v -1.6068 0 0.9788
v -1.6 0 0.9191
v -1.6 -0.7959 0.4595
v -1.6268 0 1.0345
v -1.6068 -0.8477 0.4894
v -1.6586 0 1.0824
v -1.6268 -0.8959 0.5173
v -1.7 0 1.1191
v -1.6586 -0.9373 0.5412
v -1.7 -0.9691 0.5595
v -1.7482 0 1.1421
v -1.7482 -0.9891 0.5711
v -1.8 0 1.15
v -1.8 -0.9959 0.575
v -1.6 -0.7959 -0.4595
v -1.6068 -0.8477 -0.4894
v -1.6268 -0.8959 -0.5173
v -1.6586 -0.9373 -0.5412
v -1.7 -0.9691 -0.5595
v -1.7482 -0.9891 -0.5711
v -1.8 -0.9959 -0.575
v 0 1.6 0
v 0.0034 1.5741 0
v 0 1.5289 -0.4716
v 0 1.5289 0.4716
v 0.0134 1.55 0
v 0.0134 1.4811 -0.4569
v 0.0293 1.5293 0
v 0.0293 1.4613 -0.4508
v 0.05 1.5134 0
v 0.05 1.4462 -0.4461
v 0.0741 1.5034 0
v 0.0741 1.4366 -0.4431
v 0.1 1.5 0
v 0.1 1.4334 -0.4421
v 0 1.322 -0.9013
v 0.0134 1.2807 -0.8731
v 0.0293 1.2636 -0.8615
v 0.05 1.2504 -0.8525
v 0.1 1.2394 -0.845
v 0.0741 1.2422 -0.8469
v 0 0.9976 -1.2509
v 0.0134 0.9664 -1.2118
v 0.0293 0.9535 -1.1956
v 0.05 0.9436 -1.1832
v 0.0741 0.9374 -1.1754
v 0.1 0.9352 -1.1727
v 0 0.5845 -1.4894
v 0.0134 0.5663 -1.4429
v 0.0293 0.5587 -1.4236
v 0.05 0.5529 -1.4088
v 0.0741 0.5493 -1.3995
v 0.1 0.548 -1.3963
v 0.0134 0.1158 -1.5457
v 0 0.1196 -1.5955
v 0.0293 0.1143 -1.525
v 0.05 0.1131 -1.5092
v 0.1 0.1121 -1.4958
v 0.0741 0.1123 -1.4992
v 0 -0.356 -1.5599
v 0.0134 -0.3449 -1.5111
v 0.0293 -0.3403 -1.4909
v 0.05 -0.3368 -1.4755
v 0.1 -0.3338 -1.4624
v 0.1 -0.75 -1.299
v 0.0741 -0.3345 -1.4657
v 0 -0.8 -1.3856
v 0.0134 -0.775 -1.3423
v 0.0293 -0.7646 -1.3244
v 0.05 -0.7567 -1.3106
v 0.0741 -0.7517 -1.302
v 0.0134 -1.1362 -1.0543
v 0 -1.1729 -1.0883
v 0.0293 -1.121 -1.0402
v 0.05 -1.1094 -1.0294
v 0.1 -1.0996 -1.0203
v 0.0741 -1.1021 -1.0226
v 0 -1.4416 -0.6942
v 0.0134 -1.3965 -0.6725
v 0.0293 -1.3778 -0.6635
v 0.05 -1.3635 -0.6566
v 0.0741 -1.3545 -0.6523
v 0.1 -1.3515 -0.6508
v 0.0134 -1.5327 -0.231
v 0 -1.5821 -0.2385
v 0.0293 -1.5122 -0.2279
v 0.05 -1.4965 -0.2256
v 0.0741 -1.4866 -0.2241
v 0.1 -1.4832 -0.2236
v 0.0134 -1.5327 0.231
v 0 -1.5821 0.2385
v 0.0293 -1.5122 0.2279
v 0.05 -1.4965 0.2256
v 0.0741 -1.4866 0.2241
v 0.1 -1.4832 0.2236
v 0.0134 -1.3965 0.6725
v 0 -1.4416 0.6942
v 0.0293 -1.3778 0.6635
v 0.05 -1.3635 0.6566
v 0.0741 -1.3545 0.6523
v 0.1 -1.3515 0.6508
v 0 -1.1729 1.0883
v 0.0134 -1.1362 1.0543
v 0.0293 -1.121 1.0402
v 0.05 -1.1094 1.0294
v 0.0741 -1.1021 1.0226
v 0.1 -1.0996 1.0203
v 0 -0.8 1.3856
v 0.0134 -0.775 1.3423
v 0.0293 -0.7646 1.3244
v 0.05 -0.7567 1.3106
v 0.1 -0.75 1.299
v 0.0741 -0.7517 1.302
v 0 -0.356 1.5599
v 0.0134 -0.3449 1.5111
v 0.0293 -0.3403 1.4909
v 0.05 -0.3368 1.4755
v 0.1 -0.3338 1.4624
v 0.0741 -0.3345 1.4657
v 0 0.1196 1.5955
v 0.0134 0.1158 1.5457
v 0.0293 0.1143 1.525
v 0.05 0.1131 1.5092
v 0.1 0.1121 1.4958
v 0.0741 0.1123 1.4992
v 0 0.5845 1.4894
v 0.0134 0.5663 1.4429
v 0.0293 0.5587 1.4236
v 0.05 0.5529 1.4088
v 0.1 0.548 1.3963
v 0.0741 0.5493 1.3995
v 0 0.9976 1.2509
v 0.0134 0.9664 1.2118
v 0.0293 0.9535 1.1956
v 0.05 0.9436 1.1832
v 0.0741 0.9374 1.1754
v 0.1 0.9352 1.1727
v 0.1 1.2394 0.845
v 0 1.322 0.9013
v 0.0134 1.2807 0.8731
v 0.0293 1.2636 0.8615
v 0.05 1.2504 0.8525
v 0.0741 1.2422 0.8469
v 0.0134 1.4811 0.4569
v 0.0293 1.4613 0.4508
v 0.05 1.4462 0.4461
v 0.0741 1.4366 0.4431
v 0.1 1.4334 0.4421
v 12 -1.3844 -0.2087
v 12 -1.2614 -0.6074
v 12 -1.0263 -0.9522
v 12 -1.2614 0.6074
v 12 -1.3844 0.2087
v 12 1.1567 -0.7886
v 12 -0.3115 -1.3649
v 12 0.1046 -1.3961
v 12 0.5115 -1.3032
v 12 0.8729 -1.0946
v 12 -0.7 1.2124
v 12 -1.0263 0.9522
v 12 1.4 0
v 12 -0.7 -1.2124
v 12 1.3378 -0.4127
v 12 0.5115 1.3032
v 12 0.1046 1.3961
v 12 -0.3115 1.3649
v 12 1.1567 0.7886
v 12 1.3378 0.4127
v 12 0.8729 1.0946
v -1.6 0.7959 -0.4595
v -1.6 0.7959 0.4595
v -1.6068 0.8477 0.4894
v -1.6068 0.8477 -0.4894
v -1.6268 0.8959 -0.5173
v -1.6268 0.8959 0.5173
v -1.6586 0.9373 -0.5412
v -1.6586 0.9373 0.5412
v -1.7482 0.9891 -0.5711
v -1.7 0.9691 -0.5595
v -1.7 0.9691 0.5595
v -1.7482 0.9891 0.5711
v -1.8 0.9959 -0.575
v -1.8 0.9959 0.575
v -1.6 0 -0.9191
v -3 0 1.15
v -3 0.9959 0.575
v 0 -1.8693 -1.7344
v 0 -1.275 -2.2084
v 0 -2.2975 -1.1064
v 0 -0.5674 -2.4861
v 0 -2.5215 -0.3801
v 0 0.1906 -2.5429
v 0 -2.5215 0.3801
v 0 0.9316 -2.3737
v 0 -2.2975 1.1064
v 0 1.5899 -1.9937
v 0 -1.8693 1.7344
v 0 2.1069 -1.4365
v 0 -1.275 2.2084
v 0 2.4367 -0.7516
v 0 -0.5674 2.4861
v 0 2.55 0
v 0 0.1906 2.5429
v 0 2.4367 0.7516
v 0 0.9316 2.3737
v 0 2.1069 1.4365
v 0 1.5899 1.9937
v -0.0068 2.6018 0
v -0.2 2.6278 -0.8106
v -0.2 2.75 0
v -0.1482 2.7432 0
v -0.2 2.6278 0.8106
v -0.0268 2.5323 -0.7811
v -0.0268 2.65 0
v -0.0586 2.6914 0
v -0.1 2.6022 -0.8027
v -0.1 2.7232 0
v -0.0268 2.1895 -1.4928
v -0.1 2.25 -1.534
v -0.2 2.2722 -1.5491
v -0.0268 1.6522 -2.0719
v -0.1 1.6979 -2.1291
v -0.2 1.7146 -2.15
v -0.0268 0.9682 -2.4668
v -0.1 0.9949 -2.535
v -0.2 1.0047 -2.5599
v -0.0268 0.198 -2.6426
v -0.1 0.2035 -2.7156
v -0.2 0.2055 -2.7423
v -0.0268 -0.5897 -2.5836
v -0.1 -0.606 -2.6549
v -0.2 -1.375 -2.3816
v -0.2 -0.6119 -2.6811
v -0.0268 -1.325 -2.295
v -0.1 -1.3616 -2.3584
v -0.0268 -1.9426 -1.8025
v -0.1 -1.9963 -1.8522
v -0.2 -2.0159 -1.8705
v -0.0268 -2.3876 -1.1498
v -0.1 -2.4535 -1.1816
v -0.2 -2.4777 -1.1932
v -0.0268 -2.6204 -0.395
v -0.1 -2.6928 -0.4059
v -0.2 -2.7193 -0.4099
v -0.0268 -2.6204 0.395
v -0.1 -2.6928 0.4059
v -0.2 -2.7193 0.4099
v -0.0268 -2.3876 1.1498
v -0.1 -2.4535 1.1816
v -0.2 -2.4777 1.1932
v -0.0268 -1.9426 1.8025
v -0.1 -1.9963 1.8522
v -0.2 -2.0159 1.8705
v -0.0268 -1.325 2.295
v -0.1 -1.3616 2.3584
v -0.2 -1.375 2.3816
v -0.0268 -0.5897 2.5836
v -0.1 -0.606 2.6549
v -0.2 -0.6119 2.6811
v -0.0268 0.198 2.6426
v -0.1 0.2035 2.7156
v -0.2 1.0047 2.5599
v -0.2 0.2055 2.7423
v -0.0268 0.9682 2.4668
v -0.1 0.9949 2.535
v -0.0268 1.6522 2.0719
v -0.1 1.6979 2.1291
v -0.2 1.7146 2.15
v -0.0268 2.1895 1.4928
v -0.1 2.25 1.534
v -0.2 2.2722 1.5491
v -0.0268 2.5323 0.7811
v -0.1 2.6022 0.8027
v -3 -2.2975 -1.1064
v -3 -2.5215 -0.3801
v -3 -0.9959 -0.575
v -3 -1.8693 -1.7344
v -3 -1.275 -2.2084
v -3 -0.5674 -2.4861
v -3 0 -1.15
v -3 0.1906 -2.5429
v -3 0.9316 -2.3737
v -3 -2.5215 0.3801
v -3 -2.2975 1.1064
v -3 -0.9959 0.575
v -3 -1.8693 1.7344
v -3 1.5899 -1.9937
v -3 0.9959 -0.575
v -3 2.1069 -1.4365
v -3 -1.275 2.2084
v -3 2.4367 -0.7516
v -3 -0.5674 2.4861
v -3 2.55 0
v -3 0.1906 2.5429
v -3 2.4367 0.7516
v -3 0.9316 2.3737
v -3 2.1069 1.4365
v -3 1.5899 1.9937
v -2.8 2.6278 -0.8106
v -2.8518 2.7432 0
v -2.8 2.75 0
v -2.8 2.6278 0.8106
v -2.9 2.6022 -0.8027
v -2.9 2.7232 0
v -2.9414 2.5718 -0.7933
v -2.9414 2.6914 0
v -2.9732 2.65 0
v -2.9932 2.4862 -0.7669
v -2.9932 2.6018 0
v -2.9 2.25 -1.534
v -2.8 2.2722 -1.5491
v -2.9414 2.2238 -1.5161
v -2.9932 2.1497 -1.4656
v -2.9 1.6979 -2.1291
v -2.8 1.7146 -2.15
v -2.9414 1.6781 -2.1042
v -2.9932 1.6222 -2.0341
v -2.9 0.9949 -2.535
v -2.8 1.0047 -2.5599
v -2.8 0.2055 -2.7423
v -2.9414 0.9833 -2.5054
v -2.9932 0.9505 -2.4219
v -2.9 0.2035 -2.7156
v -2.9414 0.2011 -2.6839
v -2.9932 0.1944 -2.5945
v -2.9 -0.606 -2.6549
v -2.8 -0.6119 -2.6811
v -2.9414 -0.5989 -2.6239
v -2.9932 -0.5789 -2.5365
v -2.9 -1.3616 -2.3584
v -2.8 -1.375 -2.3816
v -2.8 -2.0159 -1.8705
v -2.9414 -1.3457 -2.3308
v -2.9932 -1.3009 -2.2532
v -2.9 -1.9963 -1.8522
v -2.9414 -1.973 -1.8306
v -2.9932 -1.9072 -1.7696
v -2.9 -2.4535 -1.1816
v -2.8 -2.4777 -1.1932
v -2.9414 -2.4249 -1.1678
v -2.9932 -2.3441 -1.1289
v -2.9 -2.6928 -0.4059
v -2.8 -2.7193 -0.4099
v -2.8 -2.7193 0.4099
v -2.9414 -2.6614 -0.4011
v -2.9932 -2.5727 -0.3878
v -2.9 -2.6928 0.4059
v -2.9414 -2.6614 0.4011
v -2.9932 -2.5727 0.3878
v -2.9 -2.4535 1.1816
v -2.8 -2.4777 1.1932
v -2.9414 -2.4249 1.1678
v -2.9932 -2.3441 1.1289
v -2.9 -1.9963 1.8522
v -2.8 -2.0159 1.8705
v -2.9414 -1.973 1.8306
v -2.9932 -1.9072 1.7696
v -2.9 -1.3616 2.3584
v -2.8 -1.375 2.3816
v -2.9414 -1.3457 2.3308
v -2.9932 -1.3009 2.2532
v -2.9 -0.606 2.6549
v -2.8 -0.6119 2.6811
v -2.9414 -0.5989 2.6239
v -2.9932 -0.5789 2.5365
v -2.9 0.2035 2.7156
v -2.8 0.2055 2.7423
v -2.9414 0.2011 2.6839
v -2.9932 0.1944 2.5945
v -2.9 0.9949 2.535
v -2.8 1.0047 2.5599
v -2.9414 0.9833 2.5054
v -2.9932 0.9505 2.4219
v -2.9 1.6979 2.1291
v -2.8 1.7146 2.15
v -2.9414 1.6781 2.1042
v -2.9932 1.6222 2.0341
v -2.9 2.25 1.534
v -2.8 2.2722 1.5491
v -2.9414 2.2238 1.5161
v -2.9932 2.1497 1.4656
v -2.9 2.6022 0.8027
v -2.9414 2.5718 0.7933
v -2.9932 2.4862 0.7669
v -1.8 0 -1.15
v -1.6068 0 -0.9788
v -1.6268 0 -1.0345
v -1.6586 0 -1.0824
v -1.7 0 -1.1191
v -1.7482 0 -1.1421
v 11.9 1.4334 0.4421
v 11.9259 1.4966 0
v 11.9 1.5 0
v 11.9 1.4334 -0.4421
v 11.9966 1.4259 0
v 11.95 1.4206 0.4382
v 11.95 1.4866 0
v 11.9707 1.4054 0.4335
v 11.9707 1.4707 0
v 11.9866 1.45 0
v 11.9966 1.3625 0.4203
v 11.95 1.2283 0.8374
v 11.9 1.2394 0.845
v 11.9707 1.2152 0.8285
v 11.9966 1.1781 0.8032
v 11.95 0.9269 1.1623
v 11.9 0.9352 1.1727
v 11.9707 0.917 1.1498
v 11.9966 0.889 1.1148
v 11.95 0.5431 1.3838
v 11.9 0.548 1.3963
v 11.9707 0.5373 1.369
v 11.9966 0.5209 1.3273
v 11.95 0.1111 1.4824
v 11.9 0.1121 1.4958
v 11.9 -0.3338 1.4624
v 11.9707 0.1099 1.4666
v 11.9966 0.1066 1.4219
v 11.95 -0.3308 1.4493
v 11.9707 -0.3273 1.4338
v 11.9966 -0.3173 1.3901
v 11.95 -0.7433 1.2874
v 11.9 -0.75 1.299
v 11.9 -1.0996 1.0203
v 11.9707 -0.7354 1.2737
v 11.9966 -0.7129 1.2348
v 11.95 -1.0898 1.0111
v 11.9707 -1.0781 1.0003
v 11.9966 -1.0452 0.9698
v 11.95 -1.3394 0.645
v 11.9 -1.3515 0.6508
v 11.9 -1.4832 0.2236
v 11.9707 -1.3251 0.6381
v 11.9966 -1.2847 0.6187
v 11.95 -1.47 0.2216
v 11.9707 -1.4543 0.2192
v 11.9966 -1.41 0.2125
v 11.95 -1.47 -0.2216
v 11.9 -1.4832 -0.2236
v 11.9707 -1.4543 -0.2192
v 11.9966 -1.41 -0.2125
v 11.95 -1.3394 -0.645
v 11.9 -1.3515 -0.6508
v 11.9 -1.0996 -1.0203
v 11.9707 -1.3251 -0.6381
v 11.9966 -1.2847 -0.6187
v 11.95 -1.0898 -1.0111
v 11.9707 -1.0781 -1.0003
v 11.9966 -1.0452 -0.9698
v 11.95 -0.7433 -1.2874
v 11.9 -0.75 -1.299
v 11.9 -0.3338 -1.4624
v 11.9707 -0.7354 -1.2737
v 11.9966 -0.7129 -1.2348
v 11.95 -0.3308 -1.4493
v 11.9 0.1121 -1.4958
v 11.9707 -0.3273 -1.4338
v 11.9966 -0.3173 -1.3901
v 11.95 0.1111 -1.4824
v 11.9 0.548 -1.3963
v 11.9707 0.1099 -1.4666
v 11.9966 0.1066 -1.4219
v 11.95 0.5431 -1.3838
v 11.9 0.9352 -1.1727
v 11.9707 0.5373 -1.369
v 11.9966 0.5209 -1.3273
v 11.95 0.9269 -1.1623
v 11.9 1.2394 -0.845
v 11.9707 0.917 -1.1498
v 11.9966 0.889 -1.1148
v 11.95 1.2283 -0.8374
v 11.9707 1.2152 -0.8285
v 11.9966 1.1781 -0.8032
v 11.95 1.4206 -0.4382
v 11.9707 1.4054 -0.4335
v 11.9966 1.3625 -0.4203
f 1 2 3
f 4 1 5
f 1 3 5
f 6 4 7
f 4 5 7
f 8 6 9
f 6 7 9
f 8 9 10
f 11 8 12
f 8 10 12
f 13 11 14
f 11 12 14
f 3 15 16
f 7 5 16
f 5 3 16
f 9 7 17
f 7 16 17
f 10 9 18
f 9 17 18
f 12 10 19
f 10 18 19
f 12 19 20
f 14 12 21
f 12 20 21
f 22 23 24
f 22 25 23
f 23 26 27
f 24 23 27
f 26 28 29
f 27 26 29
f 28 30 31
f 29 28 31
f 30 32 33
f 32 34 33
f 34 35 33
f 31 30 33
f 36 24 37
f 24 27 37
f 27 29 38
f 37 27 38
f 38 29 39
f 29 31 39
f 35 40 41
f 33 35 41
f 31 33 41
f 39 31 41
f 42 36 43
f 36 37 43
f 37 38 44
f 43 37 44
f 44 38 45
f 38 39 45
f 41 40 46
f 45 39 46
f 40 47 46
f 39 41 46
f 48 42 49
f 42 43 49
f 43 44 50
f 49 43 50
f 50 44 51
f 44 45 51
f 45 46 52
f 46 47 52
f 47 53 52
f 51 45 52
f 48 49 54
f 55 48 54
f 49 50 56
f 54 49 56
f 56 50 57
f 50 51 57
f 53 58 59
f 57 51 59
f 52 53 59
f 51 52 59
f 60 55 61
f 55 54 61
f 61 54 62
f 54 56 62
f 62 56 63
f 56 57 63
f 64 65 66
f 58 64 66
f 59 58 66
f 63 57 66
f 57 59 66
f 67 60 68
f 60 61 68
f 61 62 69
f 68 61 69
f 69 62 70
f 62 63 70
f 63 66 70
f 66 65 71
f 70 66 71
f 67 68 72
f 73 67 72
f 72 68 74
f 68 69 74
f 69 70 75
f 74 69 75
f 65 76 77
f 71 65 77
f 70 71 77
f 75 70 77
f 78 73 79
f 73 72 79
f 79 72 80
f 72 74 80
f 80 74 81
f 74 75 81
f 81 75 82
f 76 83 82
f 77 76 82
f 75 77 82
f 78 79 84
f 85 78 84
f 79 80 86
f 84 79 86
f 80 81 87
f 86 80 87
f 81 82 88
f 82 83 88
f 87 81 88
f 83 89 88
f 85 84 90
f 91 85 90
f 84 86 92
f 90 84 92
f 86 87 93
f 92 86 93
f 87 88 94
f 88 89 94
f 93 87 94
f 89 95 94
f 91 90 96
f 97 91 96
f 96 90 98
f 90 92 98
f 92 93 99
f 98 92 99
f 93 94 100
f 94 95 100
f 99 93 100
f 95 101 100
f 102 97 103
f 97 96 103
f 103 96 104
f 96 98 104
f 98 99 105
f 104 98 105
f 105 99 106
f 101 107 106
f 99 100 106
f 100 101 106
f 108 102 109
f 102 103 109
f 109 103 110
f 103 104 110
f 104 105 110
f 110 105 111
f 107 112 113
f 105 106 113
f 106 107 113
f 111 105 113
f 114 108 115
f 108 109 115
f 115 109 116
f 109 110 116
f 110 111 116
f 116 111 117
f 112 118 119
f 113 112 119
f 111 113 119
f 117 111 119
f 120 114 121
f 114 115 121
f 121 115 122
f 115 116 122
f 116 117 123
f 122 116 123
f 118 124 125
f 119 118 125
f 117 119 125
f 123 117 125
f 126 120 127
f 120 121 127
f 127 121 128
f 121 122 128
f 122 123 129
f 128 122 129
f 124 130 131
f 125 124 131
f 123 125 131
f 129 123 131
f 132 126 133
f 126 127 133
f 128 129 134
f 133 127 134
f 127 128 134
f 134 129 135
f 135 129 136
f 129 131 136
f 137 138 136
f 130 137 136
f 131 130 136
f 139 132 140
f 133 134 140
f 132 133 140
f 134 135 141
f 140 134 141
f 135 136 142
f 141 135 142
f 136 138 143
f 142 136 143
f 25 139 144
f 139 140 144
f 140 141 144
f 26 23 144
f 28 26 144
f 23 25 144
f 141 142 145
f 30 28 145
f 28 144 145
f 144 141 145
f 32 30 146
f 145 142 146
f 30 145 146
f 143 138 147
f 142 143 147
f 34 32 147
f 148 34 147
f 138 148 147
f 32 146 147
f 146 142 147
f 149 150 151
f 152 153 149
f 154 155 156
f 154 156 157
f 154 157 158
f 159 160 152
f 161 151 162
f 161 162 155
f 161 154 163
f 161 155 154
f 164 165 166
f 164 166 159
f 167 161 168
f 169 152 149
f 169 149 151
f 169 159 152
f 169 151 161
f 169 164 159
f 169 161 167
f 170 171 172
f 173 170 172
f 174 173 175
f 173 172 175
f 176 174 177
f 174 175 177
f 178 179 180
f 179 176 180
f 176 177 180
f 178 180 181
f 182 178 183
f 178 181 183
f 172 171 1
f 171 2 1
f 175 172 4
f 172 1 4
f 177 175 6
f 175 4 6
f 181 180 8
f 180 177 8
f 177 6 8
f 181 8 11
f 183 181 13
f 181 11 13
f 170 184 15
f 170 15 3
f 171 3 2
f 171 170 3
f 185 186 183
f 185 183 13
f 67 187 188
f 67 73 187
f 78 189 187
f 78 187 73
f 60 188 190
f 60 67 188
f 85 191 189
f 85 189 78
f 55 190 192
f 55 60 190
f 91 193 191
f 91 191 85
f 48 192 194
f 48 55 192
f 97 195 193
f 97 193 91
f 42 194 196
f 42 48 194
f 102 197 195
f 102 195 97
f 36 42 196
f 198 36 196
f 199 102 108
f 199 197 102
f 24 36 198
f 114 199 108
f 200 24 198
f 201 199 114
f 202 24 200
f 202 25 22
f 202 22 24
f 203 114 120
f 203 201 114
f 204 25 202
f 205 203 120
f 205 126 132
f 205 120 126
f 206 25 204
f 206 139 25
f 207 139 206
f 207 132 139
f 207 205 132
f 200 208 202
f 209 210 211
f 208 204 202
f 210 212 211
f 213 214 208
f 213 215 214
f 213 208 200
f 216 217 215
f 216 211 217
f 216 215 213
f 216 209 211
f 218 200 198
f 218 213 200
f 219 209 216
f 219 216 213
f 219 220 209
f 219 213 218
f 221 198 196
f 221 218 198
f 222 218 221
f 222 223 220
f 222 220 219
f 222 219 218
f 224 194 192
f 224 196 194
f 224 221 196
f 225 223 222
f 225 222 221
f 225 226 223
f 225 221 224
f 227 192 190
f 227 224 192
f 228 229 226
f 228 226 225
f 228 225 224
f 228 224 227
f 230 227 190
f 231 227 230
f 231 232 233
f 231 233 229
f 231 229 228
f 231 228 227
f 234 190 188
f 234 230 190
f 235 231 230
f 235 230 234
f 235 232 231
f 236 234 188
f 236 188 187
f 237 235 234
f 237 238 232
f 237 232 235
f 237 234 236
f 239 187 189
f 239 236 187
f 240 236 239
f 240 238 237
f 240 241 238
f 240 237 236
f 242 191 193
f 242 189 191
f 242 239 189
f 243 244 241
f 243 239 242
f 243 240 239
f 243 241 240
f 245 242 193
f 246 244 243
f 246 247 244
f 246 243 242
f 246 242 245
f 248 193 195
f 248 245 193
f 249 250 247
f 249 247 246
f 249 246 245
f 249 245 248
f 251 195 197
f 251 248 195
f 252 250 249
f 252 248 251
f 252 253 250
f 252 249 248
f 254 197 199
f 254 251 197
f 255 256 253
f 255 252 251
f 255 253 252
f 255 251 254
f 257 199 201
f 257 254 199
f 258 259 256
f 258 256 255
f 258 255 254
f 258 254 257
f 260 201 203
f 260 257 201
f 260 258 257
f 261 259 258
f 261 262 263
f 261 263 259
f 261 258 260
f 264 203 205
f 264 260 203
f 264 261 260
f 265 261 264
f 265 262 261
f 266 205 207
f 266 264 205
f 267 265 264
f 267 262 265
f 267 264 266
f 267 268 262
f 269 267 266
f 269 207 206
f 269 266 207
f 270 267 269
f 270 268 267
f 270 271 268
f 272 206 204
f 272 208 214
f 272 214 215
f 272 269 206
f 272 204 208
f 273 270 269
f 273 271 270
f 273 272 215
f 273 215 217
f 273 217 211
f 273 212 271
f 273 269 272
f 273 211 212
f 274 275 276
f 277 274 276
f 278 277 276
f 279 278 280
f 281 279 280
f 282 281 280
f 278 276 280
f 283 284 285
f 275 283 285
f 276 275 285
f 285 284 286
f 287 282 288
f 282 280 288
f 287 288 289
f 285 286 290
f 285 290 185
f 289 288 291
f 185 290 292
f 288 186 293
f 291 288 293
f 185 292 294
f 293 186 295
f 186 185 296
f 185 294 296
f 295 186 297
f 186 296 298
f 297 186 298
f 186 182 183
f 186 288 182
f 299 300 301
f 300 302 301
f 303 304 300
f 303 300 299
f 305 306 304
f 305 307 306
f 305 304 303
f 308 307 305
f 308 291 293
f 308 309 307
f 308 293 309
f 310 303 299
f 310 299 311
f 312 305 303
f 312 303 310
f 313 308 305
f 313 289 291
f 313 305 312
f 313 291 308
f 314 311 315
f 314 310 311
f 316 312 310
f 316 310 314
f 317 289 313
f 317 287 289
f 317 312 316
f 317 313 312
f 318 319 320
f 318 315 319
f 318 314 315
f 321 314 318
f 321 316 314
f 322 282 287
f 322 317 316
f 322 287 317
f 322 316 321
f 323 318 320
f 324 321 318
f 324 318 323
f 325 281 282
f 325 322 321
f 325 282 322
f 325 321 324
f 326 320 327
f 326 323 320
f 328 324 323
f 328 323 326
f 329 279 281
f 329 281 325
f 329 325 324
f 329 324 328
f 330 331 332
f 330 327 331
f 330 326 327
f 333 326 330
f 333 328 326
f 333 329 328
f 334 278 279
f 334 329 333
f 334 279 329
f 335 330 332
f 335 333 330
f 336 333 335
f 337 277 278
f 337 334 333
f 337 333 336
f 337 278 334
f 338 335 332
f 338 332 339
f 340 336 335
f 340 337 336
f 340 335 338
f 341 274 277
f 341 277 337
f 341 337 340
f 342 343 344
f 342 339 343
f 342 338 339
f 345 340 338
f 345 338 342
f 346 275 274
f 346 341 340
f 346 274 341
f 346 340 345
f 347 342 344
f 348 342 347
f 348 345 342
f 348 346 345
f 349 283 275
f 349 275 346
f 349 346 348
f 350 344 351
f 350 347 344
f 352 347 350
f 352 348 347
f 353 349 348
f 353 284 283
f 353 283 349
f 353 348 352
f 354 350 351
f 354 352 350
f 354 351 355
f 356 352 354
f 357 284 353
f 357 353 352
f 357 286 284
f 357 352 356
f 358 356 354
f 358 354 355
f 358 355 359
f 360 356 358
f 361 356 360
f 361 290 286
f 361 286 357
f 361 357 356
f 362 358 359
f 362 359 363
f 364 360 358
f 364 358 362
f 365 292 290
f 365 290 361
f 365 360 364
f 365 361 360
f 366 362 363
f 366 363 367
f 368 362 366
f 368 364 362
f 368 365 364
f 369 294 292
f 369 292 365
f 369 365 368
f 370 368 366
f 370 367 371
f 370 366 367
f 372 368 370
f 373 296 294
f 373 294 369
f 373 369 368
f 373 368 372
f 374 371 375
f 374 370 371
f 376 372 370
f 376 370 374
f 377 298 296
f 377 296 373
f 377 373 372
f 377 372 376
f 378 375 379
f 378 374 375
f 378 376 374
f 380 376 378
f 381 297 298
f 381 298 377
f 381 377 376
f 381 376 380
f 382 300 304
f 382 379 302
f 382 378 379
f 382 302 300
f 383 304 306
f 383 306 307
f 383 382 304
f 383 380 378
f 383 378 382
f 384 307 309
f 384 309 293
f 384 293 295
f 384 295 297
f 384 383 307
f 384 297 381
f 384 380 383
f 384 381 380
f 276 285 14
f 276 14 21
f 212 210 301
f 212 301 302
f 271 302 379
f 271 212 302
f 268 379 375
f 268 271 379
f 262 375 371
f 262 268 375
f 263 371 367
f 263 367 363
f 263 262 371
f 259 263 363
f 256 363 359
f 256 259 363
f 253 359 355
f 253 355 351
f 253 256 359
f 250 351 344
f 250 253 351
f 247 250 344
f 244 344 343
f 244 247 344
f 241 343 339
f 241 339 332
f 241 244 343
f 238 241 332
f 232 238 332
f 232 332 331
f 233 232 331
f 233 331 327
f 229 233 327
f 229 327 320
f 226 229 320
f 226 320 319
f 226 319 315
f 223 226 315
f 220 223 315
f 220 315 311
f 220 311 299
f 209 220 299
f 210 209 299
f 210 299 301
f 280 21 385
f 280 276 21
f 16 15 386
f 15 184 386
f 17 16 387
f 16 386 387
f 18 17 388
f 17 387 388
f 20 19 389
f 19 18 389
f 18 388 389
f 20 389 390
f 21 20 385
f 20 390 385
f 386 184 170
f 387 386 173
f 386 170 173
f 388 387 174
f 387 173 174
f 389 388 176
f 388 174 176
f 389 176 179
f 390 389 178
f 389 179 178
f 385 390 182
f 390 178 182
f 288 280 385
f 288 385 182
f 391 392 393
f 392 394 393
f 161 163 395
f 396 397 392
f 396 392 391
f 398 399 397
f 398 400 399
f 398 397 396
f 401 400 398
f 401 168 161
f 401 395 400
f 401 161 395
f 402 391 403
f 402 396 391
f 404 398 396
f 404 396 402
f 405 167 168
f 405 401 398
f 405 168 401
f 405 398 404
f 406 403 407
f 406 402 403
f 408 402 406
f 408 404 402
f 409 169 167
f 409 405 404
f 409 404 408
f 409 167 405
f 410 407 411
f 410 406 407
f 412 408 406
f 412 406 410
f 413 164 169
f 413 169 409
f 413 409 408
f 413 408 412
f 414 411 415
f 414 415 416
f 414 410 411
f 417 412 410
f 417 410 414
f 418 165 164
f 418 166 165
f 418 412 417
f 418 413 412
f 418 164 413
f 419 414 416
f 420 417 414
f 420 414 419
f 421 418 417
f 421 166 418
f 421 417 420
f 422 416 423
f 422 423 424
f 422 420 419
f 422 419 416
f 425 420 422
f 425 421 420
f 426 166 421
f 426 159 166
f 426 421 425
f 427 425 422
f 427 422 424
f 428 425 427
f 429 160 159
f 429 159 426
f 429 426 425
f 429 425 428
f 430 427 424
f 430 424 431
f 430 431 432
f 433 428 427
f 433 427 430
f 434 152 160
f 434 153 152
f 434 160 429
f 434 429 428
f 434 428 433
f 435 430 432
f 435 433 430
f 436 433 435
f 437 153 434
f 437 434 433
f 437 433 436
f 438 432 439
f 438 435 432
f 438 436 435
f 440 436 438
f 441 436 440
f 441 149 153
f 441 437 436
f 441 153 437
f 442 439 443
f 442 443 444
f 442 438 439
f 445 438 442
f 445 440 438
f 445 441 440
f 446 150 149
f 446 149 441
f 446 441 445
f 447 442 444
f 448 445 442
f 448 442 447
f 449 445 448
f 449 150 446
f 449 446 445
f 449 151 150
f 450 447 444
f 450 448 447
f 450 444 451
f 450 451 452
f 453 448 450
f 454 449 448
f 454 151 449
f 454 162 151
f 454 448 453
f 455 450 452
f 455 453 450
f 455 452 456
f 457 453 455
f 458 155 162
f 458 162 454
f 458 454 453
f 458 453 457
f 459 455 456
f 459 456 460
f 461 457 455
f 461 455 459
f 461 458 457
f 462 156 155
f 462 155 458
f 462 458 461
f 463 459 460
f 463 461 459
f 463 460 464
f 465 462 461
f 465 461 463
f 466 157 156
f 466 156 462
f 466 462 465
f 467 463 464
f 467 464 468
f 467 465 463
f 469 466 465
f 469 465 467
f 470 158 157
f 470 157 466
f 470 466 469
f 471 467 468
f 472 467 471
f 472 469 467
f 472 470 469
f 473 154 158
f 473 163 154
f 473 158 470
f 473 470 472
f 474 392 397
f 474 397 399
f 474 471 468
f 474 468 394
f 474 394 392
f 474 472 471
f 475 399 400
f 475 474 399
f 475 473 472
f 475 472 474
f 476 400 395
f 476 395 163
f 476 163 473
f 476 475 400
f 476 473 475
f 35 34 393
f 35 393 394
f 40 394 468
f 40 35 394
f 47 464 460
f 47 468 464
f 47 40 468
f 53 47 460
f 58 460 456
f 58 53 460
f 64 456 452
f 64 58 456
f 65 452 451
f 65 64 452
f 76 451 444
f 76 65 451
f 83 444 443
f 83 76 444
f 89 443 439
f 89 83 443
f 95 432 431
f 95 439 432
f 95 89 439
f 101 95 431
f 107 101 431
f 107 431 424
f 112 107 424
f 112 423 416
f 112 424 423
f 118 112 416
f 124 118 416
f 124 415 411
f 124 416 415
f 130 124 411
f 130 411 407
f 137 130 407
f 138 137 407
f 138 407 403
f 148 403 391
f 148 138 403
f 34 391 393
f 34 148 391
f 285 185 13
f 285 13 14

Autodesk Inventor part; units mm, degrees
ref_plane "YZ Plane" through (0, 0, 0) normal (1, 0, 0) x (0, 1, 0)
ref_plane "XZ Plane" through (0, 0, 0) normal (0, 1, 0) x (-1, 0, 0)
ref_plane "XY Plane" through (0, 0, 0) normal (0, 0, 1) x (1, 0, 0)
sketch "スケッチ1" plane through (0, 0, 0) normal (0, 0, 1) x (1, 0, 0)
  line L0 (0, 0) -> (12, 0)
  line L1 (12, 0) -> (12, 1.5)
  line L2 (12, 1.5) -> (0, 1.5)
  line L3 (0, 1.5) -> (0, 0)
  line L4 (0, 0) -> (0, 2.75)
  line L5 (0, 0) -> (-3, 0)
  line L6 (-3, 0) -> (0, 0)
  line L7 (-3, 0) -> (-3, 1.15)
  line L8 (0, 0) -> (-3, 0)
  line L9 (-3, 0) -> (-3, 2.75)
  line L10 (-3, 2.75) -> (0, 2.75)
  line L11 (0, 2.75) -> (0, 0)
  dimension "d0" = 1.5
  dimension "d1" = 12
  dimension "d3" = 3
  dimension "d4" = 2.75
  dimension "d5" = 1.15
revolve "回転1" add sketch "スケッチ1" angle 360 about axis through (-3, 0, 0) along (1, 0, 0)
thread "ねじ1" size "M3x0.5" class "6g" standard "ANSI Metric M Profile" length 100
sketch "スケッチ2" plane through (-3, 0, 0) normal (-1, 0, 0) x (0, 0, 1)
  circle A0 centre (0, 0) radius 1.15 projected
  line L0 (-0.575, 0.9959) -> (0.575, 0.9959)
  line L1 (0.575, 0.9959) -> (1.15, 0)
  line L2 (1.15, 0) -> (0.575, -0.9959)
  line L3 (0.575, -0.9959) -> (-0.575, -0.9959)
  line L4 (-0.575, -0.9959) -> (-1.15, 0)
  line L5 (-1.15, 0) -> (-0.575, 0.9959)
  dimension "d10" = 1.15
  dimension "d11" = 1.9919
extrude "押し出し1" cut sketch "スケッチ2" against normal blind 1.4 contours L2 L3 L4 L5 L0 L1
fillet "フィレット1" radius 0.2 8 edges at (-1.6, 0.9959, 0) (-1.6, 0.498, 0.8625) (-1.6, 0.498, -0.8625) (-1.6, -0.498, -0.8625) (-1.6, -0.9959, 0) (-1.6, -0.498, 0.8625) (-3, -2.75, 0) (0, -2.75, 0)
fillet "フィレット2" radius 0.1 1 edges at (0, -1.5, 0)
fillet "フィレット3" radius 0.1 1 edges at (12, -1.5, 0)
properties part number "ネジアルミM3L122" material "アルミニウム 7075"
